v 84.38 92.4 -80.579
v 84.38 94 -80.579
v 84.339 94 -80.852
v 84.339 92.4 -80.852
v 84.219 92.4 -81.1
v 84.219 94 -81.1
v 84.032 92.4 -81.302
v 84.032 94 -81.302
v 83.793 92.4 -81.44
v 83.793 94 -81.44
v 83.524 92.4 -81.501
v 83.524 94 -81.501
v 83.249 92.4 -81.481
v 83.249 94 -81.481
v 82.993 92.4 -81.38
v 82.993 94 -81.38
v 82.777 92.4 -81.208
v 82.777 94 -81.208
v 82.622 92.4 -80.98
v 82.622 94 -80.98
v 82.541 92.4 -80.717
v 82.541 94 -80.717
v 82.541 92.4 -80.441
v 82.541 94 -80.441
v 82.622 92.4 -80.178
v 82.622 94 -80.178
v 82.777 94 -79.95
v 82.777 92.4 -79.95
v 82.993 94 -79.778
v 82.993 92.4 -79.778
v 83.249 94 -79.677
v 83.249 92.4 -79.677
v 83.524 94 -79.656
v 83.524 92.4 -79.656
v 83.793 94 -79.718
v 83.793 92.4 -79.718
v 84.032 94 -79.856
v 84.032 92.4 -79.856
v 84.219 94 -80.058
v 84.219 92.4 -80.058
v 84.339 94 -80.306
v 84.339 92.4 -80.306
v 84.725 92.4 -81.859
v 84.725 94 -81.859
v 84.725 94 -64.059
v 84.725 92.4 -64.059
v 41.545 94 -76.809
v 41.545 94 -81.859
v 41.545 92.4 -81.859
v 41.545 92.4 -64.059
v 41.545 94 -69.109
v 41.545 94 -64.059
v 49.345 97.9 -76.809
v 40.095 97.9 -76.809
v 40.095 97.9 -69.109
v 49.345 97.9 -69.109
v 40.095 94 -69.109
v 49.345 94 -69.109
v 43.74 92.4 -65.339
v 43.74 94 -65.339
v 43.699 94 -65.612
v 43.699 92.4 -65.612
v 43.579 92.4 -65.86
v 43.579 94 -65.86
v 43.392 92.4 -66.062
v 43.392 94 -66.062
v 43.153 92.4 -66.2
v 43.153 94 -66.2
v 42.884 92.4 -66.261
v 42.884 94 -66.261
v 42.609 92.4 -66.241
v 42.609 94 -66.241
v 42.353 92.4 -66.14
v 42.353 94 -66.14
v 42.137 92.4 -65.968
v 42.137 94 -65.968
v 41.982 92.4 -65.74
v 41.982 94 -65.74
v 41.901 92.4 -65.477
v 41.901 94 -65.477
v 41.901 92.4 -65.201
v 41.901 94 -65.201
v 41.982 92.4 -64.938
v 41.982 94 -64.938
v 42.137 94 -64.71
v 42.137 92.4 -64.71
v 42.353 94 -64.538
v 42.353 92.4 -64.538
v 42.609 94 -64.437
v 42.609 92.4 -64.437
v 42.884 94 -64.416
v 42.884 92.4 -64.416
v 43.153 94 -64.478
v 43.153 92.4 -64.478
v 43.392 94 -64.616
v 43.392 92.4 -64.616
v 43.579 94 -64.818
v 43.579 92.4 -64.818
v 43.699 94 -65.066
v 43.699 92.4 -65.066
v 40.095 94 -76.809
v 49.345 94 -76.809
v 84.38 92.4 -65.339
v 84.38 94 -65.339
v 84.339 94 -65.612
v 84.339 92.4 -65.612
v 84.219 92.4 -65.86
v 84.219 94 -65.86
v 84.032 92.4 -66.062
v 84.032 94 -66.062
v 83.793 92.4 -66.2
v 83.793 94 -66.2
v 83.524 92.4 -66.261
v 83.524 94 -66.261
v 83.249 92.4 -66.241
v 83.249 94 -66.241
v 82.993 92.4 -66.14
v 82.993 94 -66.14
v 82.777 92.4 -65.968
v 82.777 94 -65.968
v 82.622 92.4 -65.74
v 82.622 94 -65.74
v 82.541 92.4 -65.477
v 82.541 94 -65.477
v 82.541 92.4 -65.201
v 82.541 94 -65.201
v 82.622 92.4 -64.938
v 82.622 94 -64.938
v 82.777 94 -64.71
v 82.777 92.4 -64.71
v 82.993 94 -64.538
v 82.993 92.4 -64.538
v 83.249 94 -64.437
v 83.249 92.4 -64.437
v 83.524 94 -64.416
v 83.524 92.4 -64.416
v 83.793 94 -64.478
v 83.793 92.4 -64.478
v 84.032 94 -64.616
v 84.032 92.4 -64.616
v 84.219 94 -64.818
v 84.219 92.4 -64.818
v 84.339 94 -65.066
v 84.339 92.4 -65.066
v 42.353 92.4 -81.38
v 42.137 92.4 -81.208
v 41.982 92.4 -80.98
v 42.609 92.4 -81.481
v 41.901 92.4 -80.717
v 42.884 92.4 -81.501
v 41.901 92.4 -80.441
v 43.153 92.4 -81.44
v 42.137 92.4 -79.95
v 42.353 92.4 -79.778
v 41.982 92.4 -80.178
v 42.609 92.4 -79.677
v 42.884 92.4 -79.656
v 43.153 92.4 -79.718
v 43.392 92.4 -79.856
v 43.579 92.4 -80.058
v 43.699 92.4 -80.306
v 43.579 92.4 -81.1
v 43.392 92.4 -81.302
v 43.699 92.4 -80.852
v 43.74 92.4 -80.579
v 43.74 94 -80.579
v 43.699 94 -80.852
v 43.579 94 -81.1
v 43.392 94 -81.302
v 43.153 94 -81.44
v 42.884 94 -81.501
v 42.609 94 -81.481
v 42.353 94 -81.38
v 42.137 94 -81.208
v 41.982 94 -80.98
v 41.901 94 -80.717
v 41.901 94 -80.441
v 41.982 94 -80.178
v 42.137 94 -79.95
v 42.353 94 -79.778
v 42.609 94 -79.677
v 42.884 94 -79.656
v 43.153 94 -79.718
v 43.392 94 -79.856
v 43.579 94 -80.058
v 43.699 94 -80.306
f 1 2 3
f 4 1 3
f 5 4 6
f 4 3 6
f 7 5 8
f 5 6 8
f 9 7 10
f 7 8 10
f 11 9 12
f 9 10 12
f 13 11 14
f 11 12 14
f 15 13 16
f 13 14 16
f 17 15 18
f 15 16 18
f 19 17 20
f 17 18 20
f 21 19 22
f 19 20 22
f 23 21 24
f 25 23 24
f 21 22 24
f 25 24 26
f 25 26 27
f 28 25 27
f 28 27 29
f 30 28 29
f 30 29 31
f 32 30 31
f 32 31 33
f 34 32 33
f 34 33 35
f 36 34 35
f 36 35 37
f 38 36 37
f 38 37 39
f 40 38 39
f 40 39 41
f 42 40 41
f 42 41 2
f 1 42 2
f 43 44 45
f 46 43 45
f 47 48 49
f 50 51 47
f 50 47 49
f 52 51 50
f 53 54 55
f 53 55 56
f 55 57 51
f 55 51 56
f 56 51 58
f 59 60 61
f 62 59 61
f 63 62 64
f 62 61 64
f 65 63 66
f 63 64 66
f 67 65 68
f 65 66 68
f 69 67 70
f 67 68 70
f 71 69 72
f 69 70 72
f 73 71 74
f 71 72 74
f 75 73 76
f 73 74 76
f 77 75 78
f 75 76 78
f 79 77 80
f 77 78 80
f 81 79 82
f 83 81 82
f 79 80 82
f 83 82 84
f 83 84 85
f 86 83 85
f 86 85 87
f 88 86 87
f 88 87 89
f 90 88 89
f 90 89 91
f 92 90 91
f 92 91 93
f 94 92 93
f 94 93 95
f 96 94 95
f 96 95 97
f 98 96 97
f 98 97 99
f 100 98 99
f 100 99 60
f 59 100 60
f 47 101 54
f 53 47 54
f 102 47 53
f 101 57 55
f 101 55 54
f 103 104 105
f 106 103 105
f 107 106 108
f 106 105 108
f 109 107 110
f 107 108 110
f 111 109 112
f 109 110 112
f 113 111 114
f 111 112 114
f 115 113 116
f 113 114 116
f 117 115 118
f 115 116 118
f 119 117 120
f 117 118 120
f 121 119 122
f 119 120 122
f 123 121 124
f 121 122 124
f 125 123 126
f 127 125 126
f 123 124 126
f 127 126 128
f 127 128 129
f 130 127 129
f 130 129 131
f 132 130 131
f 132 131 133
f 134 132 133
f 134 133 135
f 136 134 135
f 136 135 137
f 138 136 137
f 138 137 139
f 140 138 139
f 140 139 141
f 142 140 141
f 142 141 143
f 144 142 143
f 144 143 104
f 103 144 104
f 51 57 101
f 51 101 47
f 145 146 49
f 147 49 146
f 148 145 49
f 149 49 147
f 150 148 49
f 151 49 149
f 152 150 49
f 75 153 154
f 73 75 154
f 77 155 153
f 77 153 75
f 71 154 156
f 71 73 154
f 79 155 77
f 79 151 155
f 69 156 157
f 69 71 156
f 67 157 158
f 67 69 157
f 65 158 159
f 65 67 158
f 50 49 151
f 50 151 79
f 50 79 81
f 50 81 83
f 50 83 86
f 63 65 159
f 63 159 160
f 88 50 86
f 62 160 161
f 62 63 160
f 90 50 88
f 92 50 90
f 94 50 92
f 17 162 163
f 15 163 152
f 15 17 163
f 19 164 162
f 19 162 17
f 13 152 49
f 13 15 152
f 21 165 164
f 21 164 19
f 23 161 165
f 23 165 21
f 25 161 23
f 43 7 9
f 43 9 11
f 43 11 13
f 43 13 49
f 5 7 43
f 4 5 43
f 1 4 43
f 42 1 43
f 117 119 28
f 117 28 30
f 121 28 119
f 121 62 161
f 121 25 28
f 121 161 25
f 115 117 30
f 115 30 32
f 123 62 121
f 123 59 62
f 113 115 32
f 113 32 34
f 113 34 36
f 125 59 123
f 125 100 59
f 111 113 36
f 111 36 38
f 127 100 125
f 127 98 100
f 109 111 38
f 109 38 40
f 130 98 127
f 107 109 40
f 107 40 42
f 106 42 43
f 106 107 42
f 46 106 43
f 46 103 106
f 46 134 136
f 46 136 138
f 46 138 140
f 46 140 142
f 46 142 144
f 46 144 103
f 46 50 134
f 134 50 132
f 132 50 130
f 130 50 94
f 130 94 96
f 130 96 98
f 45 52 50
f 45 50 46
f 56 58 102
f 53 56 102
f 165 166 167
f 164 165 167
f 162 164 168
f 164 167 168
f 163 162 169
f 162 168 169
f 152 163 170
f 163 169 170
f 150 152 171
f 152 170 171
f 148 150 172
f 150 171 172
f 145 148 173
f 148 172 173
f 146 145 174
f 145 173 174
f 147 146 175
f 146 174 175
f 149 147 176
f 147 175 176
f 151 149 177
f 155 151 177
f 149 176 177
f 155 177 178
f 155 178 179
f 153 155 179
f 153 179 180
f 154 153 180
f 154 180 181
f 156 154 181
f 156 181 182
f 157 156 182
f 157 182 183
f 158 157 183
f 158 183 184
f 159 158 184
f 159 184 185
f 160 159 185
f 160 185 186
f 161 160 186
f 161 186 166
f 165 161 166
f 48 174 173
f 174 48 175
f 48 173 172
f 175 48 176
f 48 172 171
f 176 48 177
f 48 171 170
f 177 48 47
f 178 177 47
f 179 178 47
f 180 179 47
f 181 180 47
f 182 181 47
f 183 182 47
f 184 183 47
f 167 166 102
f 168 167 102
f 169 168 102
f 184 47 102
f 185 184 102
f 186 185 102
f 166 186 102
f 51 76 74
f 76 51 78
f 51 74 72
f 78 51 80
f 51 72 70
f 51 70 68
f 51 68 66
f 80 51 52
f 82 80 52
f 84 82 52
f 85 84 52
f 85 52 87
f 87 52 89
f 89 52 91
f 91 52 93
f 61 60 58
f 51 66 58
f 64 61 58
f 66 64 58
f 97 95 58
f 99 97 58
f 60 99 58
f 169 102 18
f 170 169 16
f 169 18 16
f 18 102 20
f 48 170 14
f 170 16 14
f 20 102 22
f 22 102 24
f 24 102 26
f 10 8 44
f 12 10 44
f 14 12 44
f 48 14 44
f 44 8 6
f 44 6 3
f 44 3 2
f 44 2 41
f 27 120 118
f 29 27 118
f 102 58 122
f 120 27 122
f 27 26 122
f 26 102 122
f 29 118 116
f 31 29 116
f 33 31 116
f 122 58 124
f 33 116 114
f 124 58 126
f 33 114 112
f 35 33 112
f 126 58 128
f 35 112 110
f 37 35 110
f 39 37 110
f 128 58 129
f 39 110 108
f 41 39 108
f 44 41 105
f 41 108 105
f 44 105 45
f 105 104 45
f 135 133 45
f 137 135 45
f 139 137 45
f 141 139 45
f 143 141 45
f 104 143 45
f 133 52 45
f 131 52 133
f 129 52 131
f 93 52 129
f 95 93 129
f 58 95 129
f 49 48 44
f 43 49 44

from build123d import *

# Parameters (mm, degrees)
SKETCH003_W     = 43.18
SKETCH003_H     = 17.8
PAD002_DEPTH    = 1.6
SKETCH004_W     = 9.25
SKETCH004_H     = 7.7
PAD003_DEPTH    = 3.9
SKETCH005_R     = 0.925
POCKET001_DEPTH = 5


with BuildPart() as part:
    # Sketch003 → Pad002 (new body)
    with BuildSketch(Plane.XZ):
        with Locations((21.59, 8.9)):
            Rectangle(SKETCH003_W, SKETCH003_H)
    extrude(amount=PAD002_DEPTH)

    # Sketch004 (on Face5 of Pad002) → Pad003 (join)
    with BuildSketch(Plane(origin=(0, 0, 0), x_dir=(1, 0, 0), z_dir=(0, 1, 0))):
        with Locations((3.175, -8.9)):
            Rectangle(SKETCH004_W, SKETCH004_H)
    extrude(amount=PAD003_DEPTH)

    # Sketch005 (on Face4 of Pad003) → Pocket001 (cut)
    with BuildSketch(Plane(origin=(0, 0, 0), x_dir=(1, 0, 0), z_dir=(0, 1, 0))):
        with Locations((1.27, -16.52)):
            Circle(SKETCH005_R)
        with Locations((1.27, -1.28)):
            Circle(SKETCH005_R)
        with Locations((41.91, -1.28)):
            Circle(SKETCH005_R)
        with Locations((41.91, -16.52)):
            Circle(SKETCH005_R)
    extrude(amount=-POCKET001_DEPTH, mode=Mode.SUBTRACT)


with BuildPart() as part_1:
    # Body001 placement: moved
    add(part.part.moved(Location((41.545216, 94.000009, -81.858885))))


solid = part_1.part
